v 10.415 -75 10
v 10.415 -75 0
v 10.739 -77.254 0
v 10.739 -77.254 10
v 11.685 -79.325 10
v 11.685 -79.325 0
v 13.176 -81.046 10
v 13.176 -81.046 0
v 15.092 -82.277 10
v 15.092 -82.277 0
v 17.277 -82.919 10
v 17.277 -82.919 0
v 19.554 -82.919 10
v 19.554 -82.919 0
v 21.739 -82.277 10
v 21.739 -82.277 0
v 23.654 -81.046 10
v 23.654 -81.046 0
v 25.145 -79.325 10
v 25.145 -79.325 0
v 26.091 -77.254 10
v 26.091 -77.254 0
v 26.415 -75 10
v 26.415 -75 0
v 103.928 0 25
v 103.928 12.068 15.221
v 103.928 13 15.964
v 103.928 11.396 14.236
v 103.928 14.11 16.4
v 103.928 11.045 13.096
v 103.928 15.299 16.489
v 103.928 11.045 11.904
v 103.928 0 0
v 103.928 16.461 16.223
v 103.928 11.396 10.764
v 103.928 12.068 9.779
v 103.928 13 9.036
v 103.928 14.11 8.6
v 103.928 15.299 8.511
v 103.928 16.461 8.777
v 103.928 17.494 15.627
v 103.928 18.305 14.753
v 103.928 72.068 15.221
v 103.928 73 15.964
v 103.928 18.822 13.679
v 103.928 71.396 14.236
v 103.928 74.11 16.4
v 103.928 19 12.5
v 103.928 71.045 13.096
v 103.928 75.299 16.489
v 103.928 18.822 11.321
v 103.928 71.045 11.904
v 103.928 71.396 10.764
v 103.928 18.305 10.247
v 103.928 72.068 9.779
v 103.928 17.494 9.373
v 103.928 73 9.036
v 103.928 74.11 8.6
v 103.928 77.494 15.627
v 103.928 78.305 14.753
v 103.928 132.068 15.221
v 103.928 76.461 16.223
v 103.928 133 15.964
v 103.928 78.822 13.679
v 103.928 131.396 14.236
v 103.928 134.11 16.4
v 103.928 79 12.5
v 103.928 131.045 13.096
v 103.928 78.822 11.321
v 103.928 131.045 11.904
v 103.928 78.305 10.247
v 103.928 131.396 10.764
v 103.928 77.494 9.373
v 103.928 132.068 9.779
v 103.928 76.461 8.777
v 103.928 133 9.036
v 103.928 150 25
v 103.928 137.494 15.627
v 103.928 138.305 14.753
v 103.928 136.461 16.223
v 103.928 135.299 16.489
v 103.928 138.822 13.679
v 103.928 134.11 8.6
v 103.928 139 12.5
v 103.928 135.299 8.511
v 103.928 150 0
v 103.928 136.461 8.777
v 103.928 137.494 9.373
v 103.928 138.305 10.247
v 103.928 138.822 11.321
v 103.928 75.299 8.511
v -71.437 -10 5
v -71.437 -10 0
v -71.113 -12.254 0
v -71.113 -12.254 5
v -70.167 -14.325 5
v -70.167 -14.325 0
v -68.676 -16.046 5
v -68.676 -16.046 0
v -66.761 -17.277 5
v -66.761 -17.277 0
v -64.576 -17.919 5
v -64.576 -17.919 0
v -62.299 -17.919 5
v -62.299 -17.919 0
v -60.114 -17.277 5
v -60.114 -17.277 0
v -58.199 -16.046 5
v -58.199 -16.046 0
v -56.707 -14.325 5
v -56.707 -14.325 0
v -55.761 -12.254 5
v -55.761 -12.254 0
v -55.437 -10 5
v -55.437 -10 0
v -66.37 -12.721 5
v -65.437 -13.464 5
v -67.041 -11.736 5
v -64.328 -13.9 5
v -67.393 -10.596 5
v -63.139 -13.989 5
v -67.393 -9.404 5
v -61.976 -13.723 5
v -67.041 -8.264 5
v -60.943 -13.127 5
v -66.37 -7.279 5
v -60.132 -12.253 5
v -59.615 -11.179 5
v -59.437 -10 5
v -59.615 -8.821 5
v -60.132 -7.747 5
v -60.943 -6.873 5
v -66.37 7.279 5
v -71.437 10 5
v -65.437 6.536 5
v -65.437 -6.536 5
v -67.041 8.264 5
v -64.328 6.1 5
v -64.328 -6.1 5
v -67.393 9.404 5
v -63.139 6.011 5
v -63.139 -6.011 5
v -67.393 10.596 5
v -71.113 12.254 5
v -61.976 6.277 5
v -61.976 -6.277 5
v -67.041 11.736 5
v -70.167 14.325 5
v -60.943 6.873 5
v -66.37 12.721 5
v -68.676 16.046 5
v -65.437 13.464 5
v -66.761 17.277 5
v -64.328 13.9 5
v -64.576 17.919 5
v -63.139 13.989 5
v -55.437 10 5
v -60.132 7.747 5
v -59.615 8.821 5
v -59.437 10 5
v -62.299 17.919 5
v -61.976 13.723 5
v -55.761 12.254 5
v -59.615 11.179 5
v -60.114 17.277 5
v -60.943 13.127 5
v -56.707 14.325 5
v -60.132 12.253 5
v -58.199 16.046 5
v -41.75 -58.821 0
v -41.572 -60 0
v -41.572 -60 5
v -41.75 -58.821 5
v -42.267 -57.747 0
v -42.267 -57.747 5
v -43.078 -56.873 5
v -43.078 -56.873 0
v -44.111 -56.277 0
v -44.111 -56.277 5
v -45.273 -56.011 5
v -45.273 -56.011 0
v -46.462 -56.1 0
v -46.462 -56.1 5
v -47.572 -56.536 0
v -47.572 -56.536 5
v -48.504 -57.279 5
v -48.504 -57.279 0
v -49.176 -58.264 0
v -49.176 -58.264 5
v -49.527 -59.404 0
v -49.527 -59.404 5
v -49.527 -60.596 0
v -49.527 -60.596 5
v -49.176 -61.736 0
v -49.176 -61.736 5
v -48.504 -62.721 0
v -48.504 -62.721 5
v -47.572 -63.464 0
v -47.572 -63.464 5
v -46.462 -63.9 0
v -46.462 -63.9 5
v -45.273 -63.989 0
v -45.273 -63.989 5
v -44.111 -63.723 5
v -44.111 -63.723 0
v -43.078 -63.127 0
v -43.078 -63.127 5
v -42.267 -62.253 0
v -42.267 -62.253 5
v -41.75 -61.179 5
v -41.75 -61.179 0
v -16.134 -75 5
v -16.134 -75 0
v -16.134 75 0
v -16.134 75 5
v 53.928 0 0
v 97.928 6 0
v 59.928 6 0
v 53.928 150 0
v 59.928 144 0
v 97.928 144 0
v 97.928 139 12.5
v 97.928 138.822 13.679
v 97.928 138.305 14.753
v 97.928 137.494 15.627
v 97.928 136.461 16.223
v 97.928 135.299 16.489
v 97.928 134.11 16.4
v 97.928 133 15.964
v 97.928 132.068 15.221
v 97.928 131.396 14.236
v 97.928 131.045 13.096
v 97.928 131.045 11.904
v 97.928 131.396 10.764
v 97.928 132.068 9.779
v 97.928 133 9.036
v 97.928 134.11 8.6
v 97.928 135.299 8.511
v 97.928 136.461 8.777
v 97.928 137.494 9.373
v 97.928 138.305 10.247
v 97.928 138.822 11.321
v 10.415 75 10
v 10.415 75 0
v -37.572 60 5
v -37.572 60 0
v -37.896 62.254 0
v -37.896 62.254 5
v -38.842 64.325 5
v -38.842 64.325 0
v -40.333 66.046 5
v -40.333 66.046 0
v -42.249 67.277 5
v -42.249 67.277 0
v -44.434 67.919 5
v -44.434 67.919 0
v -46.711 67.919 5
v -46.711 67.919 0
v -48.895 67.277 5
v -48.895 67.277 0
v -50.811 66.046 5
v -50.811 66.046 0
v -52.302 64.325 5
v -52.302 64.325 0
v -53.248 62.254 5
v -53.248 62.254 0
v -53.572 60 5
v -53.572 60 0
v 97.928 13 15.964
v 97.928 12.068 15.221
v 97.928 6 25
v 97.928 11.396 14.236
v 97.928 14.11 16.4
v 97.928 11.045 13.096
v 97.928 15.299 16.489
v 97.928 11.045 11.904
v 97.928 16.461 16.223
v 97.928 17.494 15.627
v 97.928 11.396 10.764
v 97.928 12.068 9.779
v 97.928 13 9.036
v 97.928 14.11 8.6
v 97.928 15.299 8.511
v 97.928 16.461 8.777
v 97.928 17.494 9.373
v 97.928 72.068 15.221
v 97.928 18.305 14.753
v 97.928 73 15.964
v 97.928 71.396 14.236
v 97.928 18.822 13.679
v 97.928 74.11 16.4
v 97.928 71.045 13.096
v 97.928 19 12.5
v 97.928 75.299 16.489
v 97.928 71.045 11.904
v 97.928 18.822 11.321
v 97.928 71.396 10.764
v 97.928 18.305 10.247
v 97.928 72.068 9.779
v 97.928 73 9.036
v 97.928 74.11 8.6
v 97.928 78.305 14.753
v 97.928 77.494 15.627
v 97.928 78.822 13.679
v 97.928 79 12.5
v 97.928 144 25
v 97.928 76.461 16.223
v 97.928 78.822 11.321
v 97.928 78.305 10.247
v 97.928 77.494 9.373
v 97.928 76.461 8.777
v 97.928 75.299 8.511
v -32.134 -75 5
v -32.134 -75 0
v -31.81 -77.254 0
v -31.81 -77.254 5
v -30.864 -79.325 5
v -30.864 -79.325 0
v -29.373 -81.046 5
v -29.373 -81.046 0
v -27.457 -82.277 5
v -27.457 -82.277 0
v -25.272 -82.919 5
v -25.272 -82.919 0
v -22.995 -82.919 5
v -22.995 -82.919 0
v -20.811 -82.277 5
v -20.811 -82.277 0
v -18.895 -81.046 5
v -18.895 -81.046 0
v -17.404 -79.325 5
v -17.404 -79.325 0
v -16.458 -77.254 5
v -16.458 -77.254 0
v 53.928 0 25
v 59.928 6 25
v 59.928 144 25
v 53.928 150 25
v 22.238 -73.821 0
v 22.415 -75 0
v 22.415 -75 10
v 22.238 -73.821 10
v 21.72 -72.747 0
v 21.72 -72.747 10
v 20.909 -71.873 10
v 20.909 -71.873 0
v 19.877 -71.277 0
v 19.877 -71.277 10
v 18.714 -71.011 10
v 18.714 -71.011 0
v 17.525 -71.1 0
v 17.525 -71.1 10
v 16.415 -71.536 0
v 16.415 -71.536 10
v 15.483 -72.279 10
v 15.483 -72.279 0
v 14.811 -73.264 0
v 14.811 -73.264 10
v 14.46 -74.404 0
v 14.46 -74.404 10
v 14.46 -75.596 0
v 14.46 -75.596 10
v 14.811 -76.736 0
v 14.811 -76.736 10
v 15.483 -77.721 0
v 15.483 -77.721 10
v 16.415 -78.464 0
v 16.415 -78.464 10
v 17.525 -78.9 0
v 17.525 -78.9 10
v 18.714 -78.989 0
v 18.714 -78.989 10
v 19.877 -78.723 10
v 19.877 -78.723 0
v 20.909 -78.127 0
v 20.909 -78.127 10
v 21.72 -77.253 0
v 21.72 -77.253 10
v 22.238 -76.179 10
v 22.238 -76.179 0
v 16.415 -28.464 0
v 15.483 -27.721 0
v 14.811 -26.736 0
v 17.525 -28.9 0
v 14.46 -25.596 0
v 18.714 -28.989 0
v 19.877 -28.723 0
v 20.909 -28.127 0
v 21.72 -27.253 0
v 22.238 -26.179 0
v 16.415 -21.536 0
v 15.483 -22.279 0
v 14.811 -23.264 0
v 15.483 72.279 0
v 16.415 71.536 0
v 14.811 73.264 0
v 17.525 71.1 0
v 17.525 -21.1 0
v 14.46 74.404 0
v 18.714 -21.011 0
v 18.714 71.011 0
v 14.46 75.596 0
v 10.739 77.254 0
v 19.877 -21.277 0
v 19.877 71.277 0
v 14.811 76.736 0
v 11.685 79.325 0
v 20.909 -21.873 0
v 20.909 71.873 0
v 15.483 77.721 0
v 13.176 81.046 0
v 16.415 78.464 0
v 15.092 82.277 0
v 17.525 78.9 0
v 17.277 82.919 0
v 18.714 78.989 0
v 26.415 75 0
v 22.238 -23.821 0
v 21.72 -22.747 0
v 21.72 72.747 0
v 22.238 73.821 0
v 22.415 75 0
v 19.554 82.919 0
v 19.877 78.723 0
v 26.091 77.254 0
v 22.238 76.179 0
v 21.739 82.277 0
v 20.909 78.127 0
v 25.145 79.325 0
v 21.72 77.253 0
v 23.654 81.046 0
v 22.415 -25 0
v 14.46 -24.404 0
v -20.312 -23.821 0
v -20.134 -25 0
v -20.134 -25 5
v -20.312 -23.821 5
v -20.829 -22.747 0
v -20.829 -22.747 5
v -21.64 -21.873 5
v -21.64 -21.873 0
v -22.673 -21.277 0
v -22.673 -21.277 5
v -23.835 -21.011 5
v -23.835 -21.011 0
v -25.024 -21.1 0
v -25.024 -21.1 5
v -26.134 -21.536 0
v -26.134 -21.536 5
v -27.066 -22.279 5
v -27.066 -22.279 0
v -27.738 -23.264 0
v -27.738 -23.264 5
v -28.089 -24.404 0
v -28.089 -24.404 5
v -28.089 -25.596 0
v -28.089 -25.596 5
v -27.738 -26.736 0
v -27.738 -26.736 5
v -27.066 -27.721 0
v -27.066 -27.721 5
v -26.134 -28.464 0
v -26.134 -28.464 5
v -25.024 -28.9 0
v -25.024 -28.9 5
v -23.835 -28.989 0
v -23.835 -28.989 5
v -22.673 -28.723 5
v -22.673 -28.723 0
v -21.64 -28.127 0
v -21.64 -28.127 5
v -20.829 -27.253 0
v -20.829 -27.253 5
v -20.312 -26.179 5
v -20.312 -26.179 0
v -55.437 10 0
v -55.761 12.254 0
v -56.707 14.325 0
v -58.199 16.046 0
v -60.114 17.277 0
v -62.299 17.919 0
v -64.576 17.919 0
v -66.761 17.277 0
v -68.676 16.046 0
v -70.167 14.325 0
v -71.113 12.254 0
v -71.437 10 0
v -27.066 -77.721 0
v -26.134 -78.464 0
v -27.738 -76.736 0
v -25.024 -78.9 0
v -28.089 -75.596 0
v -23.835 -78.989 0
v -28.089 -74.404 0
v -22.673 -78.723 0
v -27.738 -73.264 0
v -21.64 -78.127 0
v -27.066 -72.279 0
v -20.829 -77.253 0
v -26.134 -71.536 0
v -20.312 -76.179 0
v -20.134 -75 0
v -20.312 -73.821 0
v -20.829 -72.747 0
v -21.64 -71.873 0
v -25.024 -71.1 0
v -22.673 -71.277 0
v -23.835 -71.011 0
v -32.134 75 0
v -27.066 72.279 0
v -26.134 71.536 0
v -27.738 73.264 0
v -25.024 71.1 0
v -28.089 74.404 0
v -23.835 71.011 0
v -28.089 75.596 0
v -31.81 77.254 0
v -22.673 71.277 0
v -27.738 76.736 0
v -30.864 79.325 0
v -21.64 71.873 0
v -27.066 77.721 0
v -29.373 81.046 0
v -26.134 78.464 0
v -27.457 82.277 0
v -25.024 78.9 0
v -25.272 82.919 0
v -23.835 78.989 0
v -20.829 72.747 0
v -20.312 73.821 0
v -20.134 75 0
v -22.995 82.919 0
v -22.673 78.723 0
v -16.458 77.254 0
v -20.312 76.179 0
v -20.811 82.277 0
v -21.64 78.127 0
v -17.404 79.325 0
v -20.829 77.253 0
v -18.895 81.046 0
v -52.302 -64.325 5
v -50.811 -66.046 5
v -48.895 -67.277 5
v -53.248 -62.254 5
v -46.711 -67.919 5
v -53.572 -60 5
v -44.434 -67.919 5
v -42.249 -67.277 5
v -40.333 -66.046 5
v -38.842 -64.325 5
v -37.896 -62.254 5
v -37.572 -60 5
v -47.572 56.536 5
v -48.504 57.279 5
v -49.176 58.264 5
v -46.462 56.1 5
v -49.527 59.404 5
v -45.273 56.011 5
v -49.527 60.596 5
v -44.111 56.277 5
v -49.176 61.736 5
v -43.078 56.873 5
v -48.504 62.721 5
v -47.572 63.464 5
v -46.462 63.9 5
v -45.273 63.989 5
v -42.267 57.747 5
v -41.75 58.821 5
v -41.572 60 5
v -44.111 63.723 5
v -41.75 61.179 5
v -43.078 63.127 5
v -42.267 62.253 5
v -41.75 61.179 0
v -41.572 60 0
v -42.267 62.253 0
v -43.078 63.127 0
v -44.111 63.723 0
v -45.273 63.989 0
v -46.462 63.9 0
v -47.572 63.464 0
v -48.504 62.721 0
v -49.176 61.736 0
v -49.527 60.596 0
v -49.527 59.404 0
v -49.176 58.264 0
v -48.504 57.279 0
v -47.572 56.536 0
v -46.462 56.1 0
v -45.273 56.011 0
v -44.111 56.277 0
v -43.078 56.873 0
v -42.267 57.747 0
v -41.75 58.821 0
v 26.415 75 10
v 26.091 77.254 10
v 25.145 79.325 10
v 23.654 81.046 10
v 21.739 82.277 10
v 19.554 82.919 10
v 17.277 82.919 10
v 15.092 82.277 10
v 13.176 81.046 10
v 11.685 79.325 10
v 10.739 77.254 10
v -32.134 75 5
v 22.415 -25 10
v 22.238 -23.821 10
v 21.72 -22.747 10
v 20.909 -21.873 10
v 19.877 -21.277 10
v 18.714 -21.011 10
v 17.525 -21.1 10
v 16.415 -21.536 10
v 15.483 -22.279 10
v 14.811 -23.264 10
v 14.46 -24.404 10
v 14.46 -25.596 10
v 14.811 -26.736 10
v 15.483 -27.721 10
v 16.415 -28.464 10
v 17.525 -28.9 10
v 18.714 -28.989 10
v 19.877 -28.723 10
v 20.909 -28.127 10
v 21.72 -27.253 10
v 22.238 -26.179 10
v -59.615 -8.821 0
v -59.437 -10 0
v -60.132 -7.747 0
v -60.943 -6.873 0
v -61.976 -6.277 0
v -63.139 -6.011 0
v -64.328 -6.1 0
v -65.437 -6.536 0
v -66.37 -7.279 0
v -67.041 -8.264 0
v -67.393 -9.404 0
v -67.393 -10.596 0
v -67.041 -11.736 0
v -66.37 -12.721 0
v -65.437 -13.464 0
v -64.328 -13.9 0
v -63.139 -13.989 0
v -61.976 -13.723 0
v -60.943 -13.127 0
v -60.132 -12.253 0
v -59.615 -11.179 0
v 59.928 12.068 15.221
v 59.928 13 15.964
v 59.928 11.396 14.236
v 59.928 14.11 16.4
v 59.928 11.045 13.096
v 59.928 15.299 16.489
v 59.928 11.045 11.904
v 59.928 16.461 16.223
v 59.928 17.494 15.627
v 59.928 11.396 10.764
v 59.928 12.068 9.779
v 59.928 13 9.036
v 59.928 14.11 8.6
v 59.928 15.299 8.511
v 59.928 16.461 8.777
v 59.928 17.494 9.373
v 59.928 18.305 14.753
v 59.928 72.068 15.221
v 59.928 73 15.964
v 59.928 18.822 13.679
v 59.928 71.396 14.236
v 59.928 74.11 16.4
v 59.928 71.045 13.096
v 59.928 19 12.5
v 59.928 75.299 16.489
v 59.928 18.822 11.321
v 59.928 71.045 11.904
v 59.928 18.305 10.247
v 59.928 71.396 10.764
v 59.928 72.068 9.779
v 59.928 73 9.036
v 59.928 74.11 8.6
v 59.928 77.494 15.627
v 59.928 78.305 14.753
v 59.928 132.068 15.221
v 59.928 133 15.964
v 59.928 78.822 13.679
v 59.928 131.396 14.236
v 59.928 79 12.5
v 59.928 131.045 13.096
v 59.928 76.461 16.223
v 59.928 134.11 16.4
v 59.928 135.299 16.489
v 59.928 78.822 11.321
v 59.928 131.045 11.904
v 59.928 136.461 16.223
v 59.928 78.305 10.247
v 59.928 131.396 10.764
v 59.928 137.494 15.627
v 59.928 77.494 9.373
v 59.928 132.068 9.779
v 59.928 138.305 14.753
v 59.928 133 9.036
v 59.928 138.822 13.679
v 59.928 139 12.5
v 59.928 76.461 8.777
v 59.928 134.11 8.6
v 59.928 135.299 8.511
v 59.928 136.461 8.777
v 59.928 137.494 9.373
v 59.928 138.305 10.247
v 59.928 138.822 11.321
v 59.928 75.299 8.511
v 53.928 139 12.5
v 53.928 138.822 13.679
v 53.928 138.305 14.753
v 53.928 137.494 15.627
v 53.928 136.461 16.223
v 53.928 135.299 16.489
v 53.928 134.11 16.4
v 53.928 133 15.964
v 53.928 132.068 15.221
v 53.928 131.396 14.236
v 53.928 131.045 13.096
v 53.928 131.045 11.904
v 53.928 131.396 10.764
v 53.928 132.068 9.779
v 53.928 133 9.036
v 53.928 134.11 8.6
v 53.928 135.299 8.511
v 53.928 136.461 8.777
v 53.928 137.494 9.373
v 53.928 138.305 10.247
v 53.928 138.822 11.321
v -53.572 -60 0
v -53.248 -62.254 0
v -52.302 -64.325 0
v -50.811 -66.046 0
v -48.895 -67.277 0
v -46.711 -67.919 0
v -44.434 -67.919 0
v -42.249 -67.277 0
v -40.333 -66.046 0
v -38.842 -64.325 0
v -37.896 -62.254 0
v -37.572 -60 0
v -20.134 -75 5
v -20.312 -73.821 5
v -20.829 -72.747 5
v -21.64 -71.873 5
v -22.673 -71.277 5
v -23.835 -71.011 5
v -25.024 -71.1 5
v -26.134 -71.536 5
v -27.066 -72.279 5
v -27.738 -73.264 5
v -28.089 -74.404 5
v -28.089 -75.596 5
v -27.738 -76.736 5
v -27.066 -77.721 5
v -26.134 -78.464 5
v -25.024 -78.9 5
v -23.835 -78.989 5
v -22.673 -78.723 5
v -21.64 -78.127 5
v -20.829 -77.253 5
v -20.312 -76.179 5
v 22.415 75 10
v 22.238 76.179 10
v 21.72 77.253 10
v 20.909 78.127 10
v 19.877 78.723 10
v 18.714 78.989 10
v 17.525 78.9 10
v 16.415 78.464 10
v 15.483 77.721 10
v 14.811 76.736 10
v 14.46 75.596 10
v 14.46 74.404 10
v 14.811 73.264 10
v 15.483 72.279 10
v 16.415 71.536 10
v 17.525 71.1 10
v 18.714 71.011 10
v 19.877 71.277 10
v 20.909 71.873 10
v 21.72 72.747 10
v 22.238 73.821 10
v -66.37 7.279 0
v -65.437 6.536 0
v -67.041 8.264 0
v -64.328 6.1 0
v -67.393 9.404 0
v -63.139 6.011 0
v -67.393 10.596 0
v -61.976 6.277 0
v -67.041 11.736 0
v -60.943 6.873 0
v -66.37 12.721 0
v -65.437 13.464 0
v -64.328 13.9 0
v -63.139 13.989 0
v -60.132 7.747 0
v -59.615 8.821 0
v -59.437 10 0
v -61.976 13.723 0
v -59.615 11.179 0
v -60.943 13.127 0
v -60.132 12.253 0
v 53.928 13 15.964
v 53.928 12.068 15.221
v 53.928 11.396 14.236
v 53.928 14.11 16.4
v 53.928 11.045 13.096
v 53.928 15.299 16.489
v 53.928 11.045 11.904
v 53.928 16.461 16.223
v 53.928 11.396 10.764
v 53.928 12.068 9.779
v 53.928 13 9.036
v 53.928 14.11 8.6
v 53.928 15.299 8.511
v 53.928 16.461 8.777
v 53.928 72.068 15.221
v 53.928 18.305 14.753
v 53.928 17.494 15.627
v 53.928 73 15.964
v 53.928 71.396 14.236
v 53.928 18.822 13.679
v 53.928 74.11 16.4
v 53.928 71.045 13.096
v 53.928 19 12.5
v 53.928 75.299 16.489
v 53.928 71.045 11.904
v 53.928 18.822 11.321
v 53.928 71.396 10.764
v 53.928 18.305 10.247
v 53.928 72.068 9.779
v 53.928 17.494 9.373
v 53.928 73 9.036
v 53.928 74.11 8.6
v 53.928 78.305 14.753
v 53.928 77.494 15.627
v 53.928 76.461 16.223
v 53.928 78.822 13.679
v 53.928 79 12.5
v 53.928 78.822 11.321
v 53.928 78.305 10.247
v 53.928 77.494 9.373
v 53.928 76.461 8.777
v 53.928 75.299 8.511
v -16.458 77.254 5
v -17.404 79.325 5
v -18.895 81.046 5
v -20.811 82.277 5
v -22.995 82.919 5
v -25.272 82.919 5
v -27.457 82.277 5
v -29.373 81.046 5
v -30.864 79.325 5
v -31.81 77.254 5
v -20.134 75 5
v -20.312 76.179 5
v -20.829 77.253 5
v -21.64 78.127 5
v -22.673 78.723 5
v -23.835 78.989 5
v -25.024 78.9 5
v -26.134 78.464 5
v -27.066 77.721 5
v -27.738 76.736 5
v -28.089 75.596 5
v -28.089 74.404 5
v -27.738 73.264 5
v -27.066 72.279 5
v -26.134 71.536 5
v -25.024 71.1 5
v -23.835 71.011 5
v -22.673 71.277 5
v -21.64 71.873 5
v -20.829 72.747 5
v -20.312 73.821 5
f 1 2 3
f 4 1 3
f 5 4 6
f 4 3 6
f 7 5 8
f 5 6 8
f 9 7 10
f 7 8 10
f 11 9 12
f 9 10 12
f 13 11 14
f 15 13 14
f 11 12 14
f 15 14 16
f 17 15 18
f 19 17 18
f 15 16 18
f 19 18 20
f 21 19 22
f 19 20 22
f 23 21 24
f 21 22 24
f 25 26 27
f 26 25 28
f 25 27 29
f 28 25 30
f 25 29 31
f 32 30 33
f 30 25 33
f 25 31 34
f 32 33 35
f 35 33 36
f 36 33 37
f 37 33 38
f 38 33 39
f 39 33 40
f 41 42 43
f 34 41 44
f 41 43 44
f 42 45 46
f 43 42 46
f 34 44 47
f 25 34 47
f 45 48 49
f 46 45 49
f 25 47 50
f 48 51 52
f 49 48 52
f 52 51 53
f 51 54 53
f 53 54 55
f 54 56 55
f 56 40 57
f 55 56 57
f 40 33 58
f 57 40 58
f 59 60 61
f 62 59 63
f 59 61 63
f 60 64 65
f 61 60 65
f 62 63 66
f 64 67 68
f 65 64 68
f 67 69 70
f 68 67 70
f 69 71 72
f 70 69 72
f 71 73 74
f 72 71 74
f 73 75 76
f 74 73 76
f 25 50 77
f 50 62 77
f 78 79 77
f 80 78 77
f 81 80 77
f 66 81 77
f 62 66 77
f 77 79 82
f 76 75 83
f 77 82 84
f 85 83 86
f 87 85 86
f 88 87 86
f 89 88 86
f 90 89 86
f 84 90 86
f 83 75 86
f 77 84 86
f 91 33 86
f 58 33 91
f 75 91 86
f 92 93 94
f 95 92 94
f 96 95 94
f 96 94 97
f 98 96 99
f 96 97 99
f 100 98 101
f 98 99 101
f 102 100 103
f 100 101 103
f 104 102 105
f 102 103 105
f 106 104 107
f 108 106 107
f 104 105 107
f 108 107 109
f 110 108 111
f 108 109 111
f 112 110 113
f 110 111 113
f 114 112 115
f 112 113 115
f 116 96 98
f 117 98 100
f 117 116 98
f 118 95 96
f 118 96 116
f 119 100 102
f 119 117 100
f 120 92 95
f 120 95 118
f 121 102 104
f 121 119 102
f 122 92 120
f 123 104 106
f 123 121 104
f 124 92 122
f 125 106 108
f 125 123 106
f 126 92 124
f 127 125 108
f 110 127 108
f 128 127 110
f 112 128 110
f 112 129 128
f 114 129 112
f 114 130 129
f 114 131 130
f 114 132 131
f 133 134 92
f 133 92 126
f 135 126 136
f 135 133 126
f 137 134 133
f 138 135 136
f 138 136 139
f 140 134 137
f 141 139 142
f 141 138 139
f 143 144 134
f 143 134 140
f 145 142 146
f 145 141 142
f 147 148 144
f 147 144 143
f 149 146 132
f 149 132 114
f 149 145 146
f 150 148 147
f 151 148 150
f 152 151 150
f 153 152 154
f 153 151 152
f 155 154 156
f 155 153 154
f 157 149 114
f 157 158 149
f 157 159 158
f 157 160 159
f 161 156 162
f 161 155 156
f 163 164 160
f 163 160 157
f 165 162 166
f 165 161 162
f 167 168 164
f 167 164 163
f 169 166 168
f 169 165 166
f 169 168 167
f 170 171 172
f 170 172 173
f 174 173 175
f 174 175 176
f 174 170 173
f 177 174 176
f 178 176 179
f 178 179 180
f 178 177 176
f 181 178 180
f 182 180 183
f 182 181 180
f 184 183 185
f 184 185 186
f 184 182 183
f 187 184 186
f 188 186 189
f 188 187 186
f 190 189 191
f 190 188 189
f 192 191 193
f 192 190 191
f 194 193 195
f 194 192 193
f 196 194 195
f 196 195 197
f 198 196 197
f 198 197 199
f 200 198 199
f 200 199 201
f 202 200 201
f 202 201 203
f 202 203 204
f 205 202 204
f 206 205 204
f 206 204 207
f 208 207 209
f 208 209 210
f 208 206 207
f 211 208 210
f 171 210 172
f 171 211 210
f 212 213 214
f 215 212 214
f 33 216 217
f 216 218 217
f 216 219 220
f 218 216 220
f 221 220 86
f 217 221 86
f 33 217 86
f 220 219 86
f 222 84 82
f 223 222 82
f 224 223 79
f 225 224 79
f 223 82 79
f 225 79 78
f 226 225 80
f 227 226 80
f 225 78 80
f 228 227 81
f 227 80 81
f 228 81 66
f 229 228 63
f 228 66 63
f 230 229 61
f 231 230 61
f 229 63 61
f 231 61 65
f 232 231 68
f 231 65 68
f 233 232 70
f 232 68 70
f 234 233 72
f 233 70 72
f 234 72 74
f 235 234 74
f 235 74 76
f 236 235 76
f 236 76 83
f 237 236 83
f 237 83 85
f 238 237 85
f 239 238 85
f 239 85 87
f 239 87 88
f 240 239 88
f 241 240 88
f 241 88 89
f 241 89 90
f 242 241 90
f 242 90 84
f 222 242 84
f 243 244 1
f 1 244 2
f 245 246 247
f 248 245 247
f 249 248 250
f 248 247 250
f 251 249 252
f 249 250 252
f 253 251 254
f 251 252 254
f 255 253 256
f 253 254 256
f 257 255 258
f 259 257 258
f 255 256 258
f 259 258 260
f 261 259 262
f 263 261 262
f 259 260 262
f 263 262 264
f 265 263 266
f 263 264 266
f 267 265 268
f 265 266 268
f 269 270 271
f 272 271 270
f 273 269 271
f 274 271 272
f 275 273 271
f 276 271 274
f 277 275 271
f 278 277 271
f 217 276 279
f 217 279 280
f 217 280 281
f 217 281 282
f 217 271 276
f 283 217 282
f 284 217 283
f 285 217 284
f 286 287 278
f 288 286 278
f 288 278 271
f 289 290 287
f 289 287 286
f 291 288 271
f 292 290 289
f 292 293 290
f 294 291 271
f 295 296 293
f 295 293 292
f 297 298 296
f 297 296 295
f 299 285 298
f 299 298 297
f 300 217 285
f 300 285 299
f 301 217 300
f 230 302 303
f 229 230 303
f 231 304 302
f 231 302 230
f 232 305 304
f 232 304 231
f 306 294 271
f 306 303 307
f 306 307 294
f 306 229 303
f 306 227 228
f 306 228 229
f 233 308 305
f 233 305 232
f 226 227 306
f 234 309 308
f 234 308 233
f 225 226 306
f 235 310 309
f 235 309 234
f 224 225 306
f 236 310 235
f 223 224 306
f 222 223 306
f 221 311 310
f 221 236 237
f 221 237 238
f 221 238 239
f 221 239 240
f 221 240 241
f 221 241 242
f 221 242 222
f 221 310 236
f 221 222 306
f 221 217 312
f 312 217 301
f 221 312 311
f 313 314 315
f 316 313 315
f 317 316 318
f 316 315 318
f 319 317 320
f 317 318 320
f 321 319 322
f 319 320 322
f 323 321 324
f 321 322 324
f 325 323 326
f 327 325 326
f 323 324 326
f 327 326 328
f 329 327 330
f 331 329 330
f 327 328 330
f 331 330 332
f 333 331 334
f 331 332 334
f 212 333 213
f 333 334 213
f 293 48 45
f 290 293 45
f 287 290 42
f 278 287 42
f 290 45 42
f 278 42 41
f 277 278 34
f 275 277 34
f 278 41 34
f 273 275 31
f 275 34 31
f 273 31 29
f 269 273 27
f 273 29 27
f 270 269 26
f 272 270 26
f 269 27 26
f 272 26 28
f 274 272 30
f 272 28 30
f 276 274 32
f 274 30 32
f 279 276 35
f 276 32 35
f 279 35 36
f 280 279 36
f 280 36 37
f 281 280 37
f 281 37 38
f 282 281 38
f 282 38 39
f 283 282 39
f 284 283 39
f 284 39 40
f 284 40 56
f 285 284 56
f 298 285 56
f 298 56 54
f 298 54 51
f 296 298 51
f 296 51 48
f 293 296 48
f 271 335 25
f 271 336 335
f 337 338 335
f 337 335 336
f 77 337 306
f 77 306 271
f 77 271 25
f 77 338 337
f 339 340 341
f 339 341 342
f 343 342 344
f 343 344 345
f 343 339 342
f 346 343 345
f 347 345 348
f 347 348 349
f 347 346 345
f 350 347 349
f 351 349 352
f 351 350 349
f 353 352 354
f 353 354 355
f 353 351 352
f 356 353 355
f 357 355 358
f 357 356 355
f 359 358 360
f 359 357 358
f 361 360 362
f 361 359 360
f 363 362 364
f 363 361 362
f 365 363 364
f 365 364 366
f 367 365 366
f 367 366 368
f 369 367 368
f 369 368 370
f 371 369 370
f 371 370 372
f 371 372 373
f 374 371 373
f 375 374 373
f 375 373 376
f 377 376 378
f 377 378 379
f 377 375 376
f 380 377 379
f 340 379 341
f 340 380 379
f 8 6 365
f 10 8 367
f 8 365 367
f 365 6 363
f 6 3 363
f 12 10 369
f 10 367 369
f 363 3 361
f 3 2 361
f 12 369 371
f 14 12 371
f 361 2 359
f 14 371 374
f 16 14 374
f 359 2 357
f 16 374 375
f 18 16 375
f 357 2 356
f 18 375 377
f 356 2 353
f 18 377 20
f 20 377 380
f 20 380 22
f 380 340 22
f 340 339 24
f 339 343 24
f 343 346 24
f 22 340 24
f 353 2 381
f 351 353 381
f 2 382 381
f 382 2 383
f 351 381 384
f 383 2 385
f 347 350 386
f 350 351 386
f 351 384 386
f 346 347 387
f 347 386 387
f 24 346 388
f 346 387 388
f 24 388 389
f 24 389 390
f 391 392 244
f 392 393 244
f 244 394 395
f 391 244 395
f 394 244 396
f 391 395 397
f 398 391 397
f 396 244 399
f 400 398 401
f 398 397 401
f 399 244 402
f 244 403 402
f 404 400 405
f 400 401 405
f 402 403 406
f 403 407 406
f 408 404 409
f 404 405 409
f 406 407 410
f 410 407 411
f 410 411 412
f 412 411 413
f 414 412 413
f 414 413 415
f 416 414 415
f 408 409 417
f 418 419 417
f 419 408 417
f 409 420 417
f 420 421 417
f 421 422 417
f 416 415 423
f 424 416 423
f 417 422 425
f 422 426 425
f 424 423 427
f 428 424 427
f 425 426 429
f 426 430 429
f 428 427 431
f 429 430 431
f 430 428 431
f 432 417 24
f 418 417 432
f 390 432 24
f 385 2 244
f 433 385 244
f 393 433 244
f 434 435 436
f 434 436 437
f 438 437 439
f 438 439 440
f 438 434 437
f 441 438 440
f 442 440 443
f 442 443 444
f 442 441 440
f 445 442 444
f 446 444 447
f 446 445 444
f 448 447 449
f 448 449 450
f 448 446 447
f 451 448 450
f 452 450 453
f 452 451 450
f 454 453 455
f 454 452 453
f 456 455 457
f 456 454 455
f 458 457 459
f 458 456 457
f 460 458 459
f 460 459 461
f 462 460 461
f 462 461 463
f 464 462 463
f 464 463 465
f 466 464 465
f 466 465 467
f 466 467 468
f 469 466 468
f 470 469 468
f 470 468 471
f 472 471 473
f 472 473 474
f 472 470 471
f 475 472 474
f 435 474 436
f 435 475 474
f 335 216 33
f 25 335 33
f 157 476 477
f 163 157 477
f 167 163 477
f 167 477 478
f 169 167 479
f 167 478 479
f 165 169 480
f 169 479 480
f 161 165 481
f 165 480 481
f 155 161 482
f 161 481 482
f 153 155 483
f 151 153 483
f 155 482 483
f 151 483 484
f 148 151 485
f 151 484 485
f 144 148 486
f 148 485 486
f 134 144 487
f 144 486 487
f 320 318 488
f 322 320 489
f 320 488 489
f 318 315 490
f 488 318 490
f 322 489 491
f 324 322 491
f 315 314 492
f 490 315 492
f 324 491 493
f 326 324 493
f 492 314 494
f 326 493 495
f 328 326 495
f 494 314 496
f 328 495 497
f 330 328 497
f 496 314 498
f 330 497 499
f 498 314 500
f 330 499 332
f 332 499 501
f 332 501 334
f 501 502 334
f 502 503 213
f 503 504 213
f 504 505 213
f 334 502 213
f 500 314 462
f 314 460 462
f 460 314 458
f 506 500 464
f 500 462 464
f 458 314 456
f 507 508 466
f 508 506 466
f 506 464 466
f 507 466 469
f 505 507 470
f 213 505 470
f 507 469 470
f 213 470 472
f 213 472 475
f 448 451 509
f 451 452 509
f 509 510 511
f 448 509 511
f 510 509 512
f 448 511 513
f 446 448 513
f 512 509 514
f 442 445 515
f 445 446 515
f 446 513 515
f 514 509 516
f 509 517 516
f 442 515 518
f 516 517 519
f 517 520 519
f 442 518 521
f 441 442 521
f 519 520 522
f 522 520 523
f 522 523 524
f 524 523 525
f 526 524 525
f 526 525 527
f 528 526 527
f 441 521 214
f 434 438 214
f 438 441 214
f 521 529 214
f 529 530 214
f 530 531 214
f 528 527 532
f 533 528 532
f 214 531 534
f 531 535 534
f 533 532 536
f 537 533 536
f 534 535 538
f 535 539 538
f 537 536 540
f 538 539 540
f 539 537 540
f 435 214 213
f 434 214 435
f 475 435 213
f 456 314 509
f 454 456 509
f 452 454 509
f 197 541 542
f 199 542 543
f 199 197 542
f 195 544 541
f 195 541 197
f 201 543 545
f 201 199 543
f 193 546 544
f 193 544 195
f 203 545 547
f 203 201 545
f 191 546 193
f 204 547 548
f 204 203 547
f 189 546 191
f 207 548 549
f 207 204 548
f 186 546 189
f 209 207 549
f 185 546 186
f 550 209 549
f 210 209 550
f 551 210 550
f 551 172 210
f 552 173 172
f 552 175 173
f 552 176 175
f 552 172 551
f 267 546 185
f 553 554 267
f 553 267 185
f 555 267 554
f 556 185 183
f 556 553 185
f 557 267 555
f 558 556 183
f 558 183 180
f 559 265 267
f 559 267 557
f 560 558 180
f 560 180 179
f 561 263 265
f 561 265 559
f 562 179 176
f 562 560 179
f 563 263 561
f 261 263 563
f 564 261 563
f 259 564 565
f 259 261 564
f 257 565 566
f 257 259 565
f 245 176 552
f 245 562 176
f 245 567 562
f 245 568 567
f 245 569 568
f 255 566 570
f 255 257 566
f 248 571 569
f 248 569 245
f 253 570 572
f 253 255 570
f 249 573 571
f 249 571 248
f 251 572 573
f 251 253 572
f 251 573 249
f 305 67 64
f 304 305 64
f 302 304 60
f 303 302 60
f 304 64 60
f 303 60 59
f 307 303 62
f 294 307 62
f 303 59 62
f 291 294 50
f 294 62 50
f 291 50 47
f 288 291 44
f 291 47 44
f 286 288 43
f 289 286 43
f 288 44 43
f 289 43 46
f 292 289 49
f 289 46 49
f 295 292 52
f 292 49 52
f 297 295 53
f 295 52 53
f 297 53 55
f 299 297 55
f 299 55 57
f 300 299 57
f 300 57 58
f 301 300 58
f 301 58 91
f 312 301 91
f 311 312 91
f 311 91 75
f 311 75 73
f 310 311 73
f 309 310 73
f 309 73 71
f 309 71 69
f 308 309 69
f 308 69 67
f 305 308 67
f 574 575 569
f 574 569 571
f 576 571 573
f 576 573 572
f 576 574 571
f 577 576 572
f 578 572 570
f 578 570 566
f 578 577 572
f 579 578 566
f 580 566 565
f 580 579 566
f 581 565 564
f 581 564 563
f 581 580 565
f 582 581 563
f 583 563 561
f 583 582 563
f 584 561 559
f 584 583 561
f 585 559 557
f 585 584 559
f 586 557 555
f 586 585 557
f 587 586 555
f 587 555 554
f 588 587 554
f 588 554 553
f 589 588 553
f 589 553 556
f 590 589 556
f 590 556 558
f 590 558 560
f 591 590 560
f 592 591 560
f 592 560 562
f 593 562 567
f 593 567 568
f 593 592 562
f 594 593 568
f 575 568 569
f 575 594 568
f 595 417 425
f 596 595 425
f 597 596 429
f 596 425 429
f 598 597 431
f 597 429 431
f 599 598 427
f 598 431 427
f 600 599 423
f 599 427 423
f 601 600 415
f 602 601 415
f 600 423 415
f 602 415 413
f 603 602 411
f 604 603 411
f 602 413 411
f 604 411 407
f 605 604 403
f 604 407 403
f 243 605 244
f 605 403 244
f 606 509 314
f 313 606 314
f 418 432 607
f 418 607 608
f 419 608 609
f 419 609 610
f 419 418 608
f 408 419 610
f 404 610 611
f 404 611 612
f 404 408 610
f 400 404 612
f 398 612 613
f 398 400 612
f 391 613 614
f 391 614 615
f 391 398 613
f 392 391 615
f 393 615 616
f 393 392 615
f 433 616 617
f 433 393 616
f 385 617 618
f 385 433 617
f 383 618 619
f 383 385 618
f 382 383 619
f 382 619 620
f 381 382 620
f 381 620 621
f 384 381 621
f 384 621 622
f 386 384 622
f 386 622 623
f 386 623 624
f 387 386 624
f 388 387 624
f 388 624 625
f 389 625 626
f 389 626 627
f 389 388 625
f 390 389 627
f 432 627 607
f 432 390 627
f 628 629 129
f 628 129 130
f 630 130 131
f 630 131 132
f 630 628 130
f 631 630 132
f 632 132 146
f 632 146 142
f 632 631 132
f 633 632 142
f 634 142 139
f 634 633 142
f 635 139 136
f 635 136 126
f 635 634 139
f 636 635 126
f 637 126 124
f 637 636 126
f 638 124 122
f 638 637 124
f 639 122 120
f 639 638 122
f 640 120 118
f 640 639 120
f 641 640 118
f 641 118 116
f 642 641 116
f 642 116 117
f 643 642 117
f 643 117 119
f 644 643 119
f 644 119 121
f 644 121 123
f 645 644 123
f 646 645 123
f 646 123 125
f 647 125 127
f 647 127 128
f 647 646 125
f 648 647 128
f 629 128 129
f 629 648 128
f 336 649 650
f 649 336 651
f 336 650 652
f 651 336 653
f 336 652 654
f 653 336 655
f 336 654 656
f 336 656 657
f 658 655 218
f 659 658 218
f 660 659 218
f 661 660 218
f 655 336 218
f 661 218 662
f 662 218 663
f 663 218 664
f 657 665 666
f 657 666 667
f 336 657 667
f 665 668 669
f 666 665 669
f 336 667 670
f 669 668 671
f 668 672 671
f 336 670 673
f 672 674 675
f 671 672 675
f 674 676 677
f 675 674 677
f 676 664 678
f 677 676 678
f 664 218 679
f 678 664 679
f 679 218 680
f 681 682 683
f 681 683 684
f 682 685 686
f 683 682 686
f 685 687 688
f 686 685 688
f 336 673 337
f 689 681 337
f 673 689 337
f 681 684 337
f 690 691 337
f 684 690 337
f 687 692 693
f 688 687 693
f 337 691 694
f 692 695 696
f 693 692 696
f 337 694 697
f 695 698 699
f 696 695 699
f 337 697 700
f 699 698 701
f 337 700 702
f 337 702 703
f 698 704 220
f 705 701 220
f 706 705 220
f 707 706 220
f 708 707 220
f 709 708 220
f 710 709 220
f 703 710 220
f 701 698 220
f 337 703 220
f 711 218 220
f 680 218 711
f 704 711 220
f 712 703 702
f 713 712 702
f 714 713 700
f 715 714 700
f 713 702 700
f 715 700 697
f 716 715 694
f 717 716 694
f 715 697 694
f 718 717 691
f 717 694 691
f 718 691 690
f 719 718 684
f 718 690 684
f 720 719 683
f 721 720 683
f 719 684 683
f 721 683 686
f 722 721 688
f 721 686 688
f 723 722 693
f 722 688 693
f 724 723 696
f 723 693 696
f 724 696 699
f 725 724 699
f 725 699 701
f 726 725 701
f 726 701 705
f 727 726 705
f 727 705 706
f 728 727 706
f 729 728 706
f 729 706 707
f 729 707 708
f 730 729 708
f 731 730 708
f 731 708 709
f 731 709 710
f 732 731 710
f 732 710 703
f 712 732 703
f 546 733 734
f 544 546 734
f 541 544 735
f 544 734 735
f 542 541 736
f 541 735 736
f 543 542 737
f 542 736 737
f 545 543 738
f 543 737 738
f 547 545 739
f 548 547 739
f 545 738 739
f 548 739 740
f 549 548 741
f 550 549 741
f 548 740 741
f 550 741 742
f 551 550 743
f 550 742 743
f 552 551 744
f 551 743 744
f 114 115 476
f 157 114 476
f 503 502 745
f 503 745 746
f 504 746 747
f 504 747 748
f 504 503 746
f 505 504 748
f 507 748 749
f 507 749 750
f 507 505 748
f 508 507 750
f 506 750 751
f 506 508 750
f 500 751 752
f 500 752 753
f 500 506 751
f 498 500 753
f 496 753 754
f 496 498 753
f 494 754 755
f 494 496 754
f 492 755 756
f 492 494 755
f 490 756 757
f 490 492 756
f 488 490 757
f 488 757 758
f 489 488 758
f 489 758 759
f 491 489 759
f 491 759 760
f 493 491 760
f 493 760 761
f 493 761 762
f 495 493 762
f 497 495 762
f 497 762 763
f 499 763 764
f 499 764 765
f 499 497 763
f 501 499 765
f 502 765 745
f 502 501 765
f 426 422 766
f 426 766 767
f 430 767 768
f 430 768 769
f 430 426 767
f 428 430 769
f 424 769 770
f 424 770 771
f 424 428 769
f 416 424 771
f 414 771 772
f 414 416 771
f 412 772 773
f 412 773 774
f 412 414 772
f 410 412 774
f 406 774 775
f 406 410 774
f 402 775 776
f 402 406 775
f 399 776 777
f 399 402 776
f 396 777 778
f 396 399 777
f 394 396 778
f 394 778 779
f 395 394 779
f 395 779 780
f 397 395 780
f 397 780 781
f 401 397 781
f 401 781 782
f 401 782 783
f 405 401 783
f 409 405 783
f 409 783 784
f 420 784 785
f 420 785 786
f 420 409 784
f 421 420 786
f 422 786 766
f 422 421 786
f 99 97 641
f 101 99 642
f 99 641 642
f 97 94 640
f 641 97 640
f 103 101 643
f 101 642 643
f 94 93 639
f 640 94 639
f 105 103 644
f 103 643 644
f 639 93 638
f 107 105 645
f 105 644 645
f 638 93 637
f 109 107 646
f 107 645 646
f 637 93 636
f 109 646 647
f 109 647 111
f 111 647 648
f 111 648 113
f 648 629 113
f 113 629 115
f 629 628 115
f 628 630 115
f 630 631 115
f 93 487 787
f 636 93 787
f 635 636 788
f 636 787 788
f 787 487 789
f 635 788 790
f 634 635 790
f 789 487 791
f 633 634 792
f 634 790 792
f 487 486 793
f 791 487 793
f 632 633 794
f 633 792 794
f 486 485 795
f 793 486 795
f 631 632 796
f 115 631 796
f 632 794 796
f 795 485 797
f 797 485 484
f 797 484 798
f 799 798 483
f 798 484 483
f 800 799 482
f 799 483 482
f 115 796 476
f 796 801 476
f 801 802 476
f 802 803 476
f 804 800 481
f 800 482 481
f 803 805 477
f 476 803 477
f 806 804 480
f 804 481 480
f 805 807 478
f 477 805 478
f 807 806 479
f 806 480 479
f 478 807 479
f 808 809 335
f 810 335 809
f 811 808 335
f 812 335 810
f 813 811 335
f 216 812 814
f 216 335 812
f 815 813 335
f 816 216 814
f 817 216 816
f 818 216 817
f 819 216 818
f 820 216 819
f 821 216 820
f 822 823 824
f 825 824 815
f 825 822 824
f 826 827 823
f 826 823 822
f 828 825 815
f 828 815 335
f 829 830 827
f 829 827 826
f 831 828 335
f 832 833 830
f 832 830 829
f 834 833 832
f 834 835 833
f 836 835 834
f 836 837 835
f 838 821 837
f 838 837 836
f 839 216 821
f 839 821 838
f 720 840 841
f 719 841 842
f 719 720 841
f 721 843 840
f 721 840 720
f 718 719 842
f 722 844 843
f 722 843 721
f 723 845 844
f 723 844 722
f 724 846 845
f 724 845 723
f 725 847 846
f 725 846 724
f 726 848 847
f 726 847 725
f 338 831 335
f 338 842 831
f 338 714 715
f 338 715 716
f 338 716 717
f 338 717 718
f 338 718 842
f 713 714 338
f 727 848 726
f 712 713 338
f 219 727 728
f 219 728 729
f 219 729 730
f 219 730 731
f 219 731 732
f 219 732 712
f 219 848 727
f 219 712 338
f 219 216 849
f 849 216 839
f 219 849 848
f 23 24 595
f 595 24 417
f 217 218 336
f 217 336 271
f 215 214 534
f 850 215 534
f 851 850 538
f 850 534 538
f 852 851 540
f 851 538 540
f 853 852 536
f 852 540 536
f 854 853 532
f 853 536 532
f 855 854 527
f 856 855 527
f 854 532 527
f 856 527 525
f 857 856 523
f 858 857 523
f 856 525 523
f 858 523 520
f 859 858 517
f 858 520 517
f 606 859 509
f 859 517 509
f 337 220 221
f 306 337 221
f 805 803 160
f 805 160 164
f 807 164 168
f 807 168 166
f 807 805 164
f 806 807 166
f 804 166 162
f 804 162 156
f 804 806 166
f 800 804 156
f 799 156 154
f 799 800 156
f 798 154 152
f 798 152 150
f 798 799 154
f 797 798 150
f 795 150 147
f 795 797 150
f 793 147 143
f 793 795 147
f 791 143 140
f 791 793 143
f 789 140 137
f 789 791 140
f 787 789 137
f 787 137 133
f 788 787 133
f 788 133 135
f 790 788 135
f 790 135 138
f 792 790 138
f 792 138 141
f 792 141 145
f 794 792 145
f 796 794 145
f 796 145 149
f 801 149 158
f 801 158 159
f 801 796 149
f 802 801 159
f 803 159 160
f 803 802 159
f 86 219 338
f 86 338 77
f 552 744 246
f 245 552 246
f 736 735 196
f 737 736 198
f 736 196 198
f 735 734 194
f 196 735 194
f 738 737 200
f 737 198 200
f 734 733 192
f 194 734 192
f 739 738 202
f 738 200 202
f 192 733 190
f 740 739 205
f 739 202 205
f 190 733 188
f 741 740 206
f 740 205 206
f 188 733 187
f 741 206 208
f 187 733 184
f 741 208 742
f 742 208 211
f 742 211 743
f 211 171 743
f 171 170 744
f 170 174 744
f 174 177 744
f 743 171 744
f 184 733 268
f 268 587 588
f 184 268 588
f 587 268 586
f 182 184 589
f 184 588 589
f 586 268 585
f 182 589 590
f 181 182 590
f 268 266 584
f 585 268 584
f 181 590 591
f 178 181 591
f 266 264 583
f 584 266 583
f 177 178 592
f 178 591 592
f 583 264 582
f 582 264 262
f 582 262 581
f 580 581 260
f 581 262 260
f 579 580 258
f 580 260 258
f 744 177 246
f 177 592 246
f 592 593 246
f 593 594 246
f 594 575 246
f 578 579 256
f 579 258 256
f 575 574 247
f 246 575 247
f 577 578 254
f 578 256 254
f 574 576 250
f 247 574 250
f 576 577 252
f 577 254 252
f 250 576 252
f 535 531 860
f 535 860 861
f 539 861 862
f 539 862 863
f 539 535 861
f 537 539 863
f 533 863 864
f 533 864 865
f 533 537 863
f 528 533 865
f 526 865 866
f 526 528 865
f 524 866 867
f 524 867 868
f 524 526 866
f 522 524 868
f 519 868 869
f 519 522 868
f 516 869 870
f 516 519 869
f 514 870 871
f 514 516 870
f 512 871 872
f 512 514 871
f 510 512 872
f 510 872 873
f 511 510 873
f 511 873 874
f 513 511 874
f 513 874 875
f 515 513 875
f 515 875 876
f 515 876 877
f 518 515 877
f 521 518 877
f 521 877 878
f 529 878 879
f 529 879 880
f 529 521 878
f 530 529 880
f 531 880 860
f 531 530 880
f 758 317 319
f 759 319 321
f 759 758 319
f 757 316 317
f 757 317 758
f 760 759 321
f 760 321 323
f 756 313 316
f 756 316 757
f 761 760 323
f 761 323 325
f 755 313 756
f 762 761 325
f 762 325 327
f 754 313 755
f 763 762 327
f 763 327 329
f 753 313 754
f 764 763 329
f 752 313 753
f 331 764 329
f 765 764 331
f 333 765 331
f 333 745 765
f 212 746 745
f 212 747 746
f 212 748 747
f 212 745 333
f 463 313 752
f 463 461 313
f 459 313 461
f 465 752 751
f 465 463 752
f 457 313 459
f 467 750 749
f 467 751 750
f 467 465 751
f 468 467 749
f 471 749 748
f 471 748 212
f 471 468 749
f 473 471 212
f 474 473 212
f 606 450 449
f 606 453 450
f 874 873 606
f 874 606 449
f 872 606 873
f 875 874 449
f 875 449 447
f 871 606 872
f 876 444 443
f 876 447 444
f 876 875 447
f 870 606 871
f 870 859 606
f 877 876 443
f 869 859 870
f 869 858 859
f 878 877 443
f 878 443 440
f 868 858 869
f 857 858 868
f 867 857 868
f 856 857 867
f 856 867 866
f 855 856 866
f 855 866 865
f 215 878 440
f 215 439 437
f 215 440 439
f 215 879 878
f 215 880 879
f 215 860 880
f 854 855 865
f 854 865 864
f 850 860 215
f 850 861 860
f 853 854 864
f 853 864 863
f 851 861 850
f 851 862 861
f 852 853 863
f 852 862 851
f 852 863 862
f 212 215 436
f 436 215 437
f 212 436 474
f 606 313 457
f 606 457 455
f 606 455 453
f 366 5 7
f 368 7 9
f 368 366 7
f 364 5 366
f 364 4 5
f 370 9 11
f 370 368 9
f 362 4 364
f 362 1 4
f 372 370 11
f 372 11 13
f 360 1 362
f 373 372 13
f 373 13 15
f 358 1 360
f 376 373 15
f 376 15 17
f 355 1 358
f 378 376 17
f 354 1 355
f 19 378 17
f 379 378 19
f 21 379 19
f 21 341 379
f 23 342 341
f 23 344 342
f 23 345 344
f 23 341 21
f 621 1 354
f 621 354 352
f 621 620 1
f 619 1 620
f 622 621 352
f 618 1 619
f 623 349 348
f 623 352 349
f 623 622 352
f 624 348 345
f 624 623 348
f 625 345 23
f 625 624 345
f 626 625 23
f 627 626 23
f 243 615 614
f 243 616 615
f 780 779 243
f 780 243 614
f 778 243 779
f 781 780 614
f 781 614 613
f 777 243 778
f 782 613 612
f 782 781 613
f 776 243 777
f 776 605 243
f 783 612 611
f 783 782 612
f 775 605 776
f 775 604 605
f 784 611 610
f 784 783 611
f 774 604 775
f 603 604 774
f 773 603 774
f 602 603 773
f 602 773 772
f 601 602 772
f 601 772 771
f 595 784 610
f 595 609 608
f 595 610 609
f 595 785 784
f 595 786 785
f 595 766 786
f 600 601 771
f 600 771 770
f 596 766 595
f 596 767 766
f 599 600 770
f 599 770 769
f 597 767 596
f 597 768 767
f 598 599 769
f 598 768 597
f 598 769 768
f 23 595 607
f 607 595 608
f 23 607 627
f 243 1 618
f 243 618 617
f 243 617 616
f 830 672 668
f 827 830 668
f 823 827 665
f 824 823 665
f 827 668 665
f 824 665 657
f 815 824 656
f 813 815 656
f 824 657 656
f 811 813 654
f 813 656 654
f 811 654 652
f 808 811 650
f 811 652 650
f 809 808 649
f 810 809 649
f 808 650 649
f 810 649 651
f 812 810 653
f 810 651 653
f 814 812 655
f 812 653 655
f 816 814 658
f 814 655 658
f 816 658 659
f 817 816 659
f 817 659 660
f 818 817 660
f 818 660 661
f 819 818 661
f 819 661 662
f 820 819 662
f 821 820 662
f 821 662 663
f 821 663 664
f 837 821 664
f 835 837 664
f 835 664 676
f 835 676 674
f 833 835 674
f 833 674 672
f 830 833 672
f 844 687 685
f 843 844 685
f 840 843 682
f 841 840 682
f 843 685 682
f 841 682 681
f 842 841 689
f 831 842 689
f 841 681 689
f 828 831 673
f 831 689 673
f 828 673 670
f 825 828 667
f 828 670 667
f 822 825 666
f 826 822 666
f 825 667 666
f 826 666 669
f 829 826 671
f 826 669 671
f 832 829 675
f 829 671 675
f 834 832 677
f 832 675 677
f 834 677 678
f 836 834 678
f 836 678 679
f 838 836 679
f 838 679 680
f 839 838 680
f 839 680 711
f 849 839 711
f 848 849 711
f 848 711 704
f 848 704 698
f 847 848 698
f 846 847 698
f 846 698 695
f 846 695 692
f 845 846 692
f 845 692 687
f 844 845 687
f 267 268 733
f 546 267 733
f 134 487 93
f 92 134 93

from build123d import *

# Parameters (mm, degrees)
F0_W      = 50
F0_H      = 150
F0_W_2    = 38
F0_H_2    = 138
F1_DEPTH  = 25
F2_R      = 4
F3_DEPTH  = 5
F4_R      = 4
F5_DEPTH  = 5
F6_R      = 4
F7_DEPTH  = 67.1
F8_R      = 4
F9_DEPTH  = 5
F10_R     = 4
F11_DEPTH = 10


with BuildPart() as f1:
    # F0 (on Top) → F1 (new body)
    with BuildSketch(Plane.XY):
        with Locations((78.928293, 75)):
            Rectangle(F0_W, F0_H)
        with Locations((78.928293, 75)):
            Rectangle(F0_W_2, F0_H_2, mode=Mode.SUBTRACT)
    extrude(amount=F1_DEPTH)

    # F6 (on face) → F7 (cut)
    with BuildSketch(Plane.YZ.offset(103.928293)):
        with Locations((15, 12.5)):
            Circle(F6_R)
        with Locations((75, 12.5)):
            Circle(F6_R)
        with Locations((135, 12.5)):
            Circle(F6_R)
    extrude(amount=-F7_DEPTH, mode=Mode.SUBTRACT)


with BuildPart() as f3:
    # F2 (on Top) → F3 (new body)
    with BuildSketch(Plane.XY):
        with BuildLine():
            Line((-16.133936, -75), (-16.133936, 0))
            Line((-16.133936, 0), (-16.133936, 75))
            ThreePointArc((-16.133936, 75), (-24.133936, 83), (-32.133936, 75))
            Line((-32.133936, 75), (-32.133936, 0))
            Line((-32.133936, 0), (-32.133936, -75))
            ThreePointArc((-32.133936, -75), (-24.133936, -83), (-16.133936, -75))
        make_face()
        with Locations((-24.133936, -75)):
            Circle(F2_R, mode=Mode.SUBTRACT)
        with Locations((-24.133936, -25)):
            Circle(F2_R, mode=Mode.SUBTRACT)
        with Locations((-24.133936, 75)):
            Circle(F2_R, mode=Mode.SUBTRACT)
    extrude(amount=F3_DEPTH)


with BuildPart() as f5:
    # F4 (on Top) → F5 (new body)
    with BuildSketch(Plane.XY):
        with BuildLine():
            Line((-37.572027, -60), (-37.572027, 0))
            Line((-37.572027, 0), (-37.572027, 60))
            ThreePointArc((-37.572027, 60), (-45.572027, 68), (-53.572027, 60))
            Line((-53.572027, 60), (-53.572027, 0))
            Line((-53.572027, 0), (-53.572027, -60))
            ThreePointArc((-53.572027, -60), (-45.572027, -68), (-37.572027, -60))
        make_face()
        with Locations((-45.572027, -60)):
            Circle(F4_R, mode=Mode.SUBTRACT)
        with Locations((-45.572027, 60)):
            Circle(F4_R, mode=Mode.SUBTRACT)
    extrude(amount=F5_DEPTH)


with BuildPart() as f9:
    # F8 (on Top) → F9 (new body)
    with BuildSketch(Plane.XY):
        with BuildLine():
            Line((-55.437424, -10), (-55.437424, 0))
            Line((-55.437424, 0), (-55.437424, 10))
            ThreePointArc((-55.437424, 10), (-63.437424, 18), (-71.437424, 10))
            Line((-71.437424, 10), (-71.437424, 0))
            Line((-71.437424, 0), (-71.437424, -10))
            ThreePointArc((-71.437424, -10), (-63.437424, -18), (-55.437424, -10))
        make_face()
        with Locations((-63.437424, -10)):
            Circle(F8_R, mode=Mode.SUBTRACT)
        with Locations((-63.437424, 10)):
            Circle(F8_R, mode=Mode.SUBTRACT)
    extrude(amount=F9_DEPTH)


with BuildPart() as f11:
    # F10 (on Top) → F11 (new body)
    with BuildSketch(Plane.XY):
        with BuildLine():
            Line((26.415282, -75), (26.415282, 0))
            Line((26.415282, 0), (26.415282, 75))
            ThreePointArc((26.415282, 75), (18.415282, 83), (10.415282, 75))
            Line((10.415282, 75), (10.415282, 0))
            Line((10.415282, 0), (10.415282, -75))
            ThreePointArc((10.415282, -75), (18.415282, -83), (26.415282, -75))
        make_face()
        with Locations((18.415282, -75)):
            Circle(F10_R, mode=Mode.SUBTRACT)
        with Locations((18.415282, -25)):
            Circle(F10_R, mode=Mode.SUBTRACT)
        with Locations((18.415282, 75)):
            Circle(F10_R, mode=Mode.SUBTRACT)
    extrude(amount=F11_DEPTH)


solid = Compound([f1.part, f3.part, f5.part, f9.part, f11.part])
